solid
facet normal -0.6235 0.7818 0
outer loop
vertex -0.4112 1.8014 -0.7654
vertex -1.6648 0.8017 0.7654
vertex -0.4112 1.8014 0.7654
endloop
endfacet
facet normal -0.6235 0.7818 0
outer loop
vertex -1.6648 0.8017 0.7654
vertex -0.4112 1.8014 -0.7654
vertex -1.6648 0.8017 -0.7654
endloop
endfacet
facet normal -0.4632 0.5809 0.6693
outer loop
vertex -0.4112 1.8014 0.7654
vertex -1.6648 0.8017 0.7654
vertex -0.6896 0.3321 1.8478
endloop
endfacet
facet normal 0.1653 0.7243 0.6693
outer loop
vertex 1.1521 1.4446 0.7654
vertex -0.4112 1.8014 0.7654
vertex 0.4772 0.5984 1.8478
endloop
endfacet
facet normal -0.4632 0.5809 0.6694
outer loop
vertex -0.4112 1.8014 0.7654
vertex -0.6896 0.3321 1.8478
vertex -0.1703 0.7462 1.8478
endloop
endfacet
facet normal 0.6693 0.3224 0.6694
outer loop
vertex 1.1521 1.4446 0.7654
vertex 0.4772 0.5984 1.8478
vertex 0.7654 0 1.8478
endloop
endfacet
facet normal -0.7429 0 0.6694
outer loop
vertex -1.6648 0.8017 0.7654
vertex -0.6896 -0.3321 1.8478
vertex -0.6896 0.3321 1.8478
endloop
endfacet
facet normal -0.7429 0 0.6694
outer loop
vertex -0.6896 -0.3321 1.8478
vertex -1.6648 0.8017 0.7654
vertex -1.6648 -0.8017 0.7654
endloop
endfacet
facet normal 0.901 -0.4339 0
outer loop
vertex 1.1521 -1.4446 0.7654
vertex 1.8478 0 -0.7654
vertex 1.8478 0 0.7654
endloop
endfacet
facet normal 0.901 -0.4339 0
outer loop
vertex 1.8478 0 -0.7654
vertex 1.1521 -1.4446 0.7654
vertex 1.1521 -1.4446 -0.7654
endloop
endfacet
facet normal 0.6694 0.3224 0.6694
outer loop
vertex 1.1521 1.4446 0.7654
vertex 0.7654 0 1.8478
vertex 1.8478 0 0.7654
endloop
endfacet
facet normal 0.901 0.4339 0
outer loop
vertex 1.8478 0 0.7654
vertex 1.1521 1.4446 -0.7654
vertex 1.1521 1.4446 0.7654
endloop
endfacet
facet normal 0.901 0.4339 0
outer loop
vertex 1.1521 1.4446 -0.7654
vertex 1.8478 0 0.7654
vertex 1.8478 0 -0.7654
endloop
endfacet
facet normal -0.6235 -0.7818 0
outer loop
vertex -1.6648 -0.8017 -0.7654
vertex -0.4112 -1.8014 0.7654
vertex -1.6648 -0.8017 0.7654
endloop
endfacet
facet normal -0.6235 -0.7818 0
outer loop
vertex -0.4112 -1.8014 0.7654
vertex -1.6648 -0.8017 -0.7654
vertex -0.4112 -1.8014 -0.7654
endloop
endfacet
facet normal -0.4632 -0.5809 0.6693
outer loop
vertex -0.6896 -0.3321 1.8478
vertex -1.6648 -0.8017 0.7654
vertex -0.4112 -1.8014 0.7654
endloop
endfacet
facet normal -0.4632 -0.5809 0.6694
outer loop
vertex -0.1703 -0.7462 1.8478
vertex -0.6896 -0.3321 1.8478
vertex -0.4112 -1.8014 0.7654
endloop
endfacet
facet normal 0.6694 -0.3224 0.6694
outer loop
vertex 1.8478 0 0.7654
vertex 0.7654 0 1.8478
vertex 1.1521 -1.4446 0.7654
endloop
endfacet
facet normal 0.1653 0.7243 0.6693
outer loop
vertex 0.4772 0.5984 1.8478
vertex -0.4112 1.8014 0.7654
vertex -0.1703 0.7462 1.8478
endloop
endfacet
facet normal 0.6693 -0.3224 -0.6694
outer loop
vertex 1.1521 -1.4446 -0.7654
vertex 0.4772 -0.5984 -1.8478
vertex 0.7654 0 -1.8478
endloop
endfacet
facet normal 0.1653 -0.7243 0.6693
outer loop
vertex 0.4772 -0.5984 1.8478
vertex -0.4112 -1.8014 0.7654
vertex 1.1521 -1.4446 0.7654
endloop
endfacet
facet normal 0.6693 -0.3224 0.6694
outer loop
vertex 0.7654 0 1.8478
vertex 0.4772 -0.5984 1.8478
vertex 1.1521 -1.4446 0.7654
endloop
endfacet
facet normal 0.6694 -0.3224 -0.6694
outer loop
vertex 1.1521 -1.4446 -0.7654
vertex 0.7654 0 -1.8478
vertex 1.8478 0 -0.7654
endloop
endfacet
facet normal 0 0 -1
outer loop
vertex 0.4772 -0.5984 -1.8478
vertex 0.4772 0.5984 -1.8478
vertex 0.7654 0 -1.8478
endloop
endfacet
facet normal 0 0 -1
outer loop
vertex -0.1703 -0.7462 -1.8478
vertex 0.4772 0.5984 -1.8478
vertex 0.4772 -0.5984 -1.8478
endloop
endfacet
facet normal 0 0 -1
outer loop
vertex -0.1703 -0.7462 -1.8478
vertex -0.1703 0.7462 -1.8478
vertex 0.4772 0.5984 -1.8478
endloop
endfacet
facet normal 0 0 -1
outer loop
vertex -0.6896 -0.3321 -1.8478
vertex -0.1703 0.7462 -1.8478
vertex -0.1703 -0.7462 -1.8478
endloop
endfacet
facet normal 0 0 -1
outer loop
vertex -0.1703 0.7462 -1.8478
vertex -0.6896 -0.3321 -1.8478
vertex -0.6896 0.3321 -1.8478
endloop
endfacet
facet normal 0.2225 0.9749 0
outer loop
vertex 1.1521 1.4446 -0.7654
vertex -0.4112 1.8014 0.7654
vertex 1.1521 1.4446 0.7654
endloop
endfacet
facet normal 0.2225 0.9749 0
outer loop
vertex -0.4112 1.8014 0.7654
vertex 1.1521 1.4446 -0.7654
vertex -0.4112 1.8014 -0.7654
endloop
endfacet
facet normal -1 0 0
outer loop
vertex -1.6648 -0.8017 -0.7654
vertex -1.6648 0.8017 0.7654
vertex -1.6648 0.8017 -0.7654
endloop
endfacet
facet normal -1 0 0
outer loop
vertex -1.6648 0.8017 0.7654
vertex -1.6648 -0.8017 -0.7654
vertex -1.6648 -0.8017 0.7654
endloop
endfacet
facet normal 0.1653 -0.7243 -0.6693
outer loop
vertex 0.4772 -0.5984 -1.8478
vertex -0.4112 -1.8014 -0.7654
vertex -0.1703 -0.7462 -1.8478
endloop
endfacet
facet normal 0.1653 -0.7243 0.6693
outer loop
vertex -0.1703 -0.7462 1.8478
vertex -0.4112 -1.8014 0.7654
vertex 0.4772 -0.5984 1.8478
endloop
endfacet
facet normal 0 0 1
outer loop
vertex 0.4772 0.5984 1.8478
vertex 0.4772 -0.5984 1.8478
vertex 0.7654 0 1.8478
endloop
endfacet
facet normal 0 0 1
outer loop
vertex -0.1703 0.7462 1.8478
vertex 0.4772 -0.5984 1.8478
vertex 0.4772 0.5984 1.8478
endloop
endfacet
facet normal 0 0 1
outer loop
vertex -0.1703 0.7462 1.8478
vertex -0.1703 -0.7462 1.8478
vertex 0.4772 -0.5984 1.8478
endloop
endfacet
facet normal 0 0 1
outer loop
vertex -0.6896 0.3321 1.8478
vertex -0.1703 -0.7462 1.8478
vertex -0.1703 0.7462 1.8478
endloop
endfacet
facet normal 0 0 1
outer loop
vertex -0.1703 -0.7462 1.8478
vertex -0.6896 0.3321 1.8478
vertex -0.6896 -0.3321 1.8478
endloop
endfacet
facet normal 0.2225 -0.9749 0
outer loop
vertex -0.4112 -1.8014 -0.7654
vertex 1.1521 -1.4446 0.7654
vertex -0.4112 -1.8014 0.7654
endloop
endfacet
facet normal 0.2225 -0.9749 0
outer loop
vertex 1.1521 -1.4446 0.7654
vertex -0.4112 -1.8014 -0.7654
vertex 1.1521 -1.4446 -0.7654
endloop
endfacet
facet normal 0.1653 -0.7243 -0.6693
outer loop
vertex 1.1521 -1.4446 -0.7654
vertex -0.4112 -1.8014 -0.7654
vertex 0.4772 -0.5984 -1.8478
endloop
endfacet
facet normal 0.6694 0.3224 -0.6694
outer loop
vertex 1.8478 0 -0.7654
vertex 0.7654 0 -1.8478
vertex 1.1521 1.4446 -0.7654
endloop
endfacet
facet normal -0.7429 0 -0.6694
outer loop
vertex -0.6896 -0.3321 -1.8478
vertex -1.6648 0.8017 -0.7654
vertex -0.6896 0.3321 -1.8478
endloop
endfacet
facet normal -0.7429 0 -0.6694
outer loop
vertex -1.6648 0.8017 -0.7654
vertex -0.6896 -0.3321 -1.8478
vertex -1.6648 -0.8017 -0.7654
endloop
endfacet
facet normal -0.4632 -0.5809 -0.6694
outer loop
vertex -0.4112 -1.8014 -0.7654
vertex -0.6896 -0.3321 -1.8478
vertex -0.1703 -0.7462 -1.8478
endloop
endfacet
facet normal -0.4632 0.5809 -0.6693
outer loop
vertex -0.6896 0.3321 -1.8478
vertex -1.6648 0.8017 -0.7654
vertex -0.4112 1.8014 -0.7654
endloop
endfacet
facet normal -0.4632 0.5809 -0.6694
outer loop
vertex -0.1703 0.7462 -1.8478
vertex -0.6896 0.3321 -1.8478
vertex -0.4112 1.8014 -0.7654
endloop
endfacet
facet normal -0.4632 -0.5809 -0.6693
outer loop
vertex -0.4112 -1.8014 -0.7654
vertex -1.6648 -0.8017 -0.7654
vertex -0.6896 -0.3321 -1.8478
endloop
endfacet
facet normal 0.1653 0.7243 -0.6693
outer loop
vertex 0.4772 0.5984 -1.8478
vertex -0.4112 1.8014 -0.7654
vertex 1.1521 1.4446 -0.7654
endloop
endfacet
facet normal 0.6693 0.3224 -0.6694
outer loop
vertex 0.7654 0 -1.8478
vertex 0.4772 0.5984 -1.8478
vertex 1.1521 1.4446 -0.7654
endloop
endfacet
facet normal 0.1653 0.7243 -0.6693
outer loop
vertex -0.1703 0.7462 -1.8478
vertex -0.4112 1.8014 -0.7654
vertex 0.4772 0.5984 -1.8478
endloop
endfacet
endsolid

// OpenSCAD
module m() #children(0);
m() cube(1);
module m3() !children(0);
m3() cube(1);
sphere(2);
